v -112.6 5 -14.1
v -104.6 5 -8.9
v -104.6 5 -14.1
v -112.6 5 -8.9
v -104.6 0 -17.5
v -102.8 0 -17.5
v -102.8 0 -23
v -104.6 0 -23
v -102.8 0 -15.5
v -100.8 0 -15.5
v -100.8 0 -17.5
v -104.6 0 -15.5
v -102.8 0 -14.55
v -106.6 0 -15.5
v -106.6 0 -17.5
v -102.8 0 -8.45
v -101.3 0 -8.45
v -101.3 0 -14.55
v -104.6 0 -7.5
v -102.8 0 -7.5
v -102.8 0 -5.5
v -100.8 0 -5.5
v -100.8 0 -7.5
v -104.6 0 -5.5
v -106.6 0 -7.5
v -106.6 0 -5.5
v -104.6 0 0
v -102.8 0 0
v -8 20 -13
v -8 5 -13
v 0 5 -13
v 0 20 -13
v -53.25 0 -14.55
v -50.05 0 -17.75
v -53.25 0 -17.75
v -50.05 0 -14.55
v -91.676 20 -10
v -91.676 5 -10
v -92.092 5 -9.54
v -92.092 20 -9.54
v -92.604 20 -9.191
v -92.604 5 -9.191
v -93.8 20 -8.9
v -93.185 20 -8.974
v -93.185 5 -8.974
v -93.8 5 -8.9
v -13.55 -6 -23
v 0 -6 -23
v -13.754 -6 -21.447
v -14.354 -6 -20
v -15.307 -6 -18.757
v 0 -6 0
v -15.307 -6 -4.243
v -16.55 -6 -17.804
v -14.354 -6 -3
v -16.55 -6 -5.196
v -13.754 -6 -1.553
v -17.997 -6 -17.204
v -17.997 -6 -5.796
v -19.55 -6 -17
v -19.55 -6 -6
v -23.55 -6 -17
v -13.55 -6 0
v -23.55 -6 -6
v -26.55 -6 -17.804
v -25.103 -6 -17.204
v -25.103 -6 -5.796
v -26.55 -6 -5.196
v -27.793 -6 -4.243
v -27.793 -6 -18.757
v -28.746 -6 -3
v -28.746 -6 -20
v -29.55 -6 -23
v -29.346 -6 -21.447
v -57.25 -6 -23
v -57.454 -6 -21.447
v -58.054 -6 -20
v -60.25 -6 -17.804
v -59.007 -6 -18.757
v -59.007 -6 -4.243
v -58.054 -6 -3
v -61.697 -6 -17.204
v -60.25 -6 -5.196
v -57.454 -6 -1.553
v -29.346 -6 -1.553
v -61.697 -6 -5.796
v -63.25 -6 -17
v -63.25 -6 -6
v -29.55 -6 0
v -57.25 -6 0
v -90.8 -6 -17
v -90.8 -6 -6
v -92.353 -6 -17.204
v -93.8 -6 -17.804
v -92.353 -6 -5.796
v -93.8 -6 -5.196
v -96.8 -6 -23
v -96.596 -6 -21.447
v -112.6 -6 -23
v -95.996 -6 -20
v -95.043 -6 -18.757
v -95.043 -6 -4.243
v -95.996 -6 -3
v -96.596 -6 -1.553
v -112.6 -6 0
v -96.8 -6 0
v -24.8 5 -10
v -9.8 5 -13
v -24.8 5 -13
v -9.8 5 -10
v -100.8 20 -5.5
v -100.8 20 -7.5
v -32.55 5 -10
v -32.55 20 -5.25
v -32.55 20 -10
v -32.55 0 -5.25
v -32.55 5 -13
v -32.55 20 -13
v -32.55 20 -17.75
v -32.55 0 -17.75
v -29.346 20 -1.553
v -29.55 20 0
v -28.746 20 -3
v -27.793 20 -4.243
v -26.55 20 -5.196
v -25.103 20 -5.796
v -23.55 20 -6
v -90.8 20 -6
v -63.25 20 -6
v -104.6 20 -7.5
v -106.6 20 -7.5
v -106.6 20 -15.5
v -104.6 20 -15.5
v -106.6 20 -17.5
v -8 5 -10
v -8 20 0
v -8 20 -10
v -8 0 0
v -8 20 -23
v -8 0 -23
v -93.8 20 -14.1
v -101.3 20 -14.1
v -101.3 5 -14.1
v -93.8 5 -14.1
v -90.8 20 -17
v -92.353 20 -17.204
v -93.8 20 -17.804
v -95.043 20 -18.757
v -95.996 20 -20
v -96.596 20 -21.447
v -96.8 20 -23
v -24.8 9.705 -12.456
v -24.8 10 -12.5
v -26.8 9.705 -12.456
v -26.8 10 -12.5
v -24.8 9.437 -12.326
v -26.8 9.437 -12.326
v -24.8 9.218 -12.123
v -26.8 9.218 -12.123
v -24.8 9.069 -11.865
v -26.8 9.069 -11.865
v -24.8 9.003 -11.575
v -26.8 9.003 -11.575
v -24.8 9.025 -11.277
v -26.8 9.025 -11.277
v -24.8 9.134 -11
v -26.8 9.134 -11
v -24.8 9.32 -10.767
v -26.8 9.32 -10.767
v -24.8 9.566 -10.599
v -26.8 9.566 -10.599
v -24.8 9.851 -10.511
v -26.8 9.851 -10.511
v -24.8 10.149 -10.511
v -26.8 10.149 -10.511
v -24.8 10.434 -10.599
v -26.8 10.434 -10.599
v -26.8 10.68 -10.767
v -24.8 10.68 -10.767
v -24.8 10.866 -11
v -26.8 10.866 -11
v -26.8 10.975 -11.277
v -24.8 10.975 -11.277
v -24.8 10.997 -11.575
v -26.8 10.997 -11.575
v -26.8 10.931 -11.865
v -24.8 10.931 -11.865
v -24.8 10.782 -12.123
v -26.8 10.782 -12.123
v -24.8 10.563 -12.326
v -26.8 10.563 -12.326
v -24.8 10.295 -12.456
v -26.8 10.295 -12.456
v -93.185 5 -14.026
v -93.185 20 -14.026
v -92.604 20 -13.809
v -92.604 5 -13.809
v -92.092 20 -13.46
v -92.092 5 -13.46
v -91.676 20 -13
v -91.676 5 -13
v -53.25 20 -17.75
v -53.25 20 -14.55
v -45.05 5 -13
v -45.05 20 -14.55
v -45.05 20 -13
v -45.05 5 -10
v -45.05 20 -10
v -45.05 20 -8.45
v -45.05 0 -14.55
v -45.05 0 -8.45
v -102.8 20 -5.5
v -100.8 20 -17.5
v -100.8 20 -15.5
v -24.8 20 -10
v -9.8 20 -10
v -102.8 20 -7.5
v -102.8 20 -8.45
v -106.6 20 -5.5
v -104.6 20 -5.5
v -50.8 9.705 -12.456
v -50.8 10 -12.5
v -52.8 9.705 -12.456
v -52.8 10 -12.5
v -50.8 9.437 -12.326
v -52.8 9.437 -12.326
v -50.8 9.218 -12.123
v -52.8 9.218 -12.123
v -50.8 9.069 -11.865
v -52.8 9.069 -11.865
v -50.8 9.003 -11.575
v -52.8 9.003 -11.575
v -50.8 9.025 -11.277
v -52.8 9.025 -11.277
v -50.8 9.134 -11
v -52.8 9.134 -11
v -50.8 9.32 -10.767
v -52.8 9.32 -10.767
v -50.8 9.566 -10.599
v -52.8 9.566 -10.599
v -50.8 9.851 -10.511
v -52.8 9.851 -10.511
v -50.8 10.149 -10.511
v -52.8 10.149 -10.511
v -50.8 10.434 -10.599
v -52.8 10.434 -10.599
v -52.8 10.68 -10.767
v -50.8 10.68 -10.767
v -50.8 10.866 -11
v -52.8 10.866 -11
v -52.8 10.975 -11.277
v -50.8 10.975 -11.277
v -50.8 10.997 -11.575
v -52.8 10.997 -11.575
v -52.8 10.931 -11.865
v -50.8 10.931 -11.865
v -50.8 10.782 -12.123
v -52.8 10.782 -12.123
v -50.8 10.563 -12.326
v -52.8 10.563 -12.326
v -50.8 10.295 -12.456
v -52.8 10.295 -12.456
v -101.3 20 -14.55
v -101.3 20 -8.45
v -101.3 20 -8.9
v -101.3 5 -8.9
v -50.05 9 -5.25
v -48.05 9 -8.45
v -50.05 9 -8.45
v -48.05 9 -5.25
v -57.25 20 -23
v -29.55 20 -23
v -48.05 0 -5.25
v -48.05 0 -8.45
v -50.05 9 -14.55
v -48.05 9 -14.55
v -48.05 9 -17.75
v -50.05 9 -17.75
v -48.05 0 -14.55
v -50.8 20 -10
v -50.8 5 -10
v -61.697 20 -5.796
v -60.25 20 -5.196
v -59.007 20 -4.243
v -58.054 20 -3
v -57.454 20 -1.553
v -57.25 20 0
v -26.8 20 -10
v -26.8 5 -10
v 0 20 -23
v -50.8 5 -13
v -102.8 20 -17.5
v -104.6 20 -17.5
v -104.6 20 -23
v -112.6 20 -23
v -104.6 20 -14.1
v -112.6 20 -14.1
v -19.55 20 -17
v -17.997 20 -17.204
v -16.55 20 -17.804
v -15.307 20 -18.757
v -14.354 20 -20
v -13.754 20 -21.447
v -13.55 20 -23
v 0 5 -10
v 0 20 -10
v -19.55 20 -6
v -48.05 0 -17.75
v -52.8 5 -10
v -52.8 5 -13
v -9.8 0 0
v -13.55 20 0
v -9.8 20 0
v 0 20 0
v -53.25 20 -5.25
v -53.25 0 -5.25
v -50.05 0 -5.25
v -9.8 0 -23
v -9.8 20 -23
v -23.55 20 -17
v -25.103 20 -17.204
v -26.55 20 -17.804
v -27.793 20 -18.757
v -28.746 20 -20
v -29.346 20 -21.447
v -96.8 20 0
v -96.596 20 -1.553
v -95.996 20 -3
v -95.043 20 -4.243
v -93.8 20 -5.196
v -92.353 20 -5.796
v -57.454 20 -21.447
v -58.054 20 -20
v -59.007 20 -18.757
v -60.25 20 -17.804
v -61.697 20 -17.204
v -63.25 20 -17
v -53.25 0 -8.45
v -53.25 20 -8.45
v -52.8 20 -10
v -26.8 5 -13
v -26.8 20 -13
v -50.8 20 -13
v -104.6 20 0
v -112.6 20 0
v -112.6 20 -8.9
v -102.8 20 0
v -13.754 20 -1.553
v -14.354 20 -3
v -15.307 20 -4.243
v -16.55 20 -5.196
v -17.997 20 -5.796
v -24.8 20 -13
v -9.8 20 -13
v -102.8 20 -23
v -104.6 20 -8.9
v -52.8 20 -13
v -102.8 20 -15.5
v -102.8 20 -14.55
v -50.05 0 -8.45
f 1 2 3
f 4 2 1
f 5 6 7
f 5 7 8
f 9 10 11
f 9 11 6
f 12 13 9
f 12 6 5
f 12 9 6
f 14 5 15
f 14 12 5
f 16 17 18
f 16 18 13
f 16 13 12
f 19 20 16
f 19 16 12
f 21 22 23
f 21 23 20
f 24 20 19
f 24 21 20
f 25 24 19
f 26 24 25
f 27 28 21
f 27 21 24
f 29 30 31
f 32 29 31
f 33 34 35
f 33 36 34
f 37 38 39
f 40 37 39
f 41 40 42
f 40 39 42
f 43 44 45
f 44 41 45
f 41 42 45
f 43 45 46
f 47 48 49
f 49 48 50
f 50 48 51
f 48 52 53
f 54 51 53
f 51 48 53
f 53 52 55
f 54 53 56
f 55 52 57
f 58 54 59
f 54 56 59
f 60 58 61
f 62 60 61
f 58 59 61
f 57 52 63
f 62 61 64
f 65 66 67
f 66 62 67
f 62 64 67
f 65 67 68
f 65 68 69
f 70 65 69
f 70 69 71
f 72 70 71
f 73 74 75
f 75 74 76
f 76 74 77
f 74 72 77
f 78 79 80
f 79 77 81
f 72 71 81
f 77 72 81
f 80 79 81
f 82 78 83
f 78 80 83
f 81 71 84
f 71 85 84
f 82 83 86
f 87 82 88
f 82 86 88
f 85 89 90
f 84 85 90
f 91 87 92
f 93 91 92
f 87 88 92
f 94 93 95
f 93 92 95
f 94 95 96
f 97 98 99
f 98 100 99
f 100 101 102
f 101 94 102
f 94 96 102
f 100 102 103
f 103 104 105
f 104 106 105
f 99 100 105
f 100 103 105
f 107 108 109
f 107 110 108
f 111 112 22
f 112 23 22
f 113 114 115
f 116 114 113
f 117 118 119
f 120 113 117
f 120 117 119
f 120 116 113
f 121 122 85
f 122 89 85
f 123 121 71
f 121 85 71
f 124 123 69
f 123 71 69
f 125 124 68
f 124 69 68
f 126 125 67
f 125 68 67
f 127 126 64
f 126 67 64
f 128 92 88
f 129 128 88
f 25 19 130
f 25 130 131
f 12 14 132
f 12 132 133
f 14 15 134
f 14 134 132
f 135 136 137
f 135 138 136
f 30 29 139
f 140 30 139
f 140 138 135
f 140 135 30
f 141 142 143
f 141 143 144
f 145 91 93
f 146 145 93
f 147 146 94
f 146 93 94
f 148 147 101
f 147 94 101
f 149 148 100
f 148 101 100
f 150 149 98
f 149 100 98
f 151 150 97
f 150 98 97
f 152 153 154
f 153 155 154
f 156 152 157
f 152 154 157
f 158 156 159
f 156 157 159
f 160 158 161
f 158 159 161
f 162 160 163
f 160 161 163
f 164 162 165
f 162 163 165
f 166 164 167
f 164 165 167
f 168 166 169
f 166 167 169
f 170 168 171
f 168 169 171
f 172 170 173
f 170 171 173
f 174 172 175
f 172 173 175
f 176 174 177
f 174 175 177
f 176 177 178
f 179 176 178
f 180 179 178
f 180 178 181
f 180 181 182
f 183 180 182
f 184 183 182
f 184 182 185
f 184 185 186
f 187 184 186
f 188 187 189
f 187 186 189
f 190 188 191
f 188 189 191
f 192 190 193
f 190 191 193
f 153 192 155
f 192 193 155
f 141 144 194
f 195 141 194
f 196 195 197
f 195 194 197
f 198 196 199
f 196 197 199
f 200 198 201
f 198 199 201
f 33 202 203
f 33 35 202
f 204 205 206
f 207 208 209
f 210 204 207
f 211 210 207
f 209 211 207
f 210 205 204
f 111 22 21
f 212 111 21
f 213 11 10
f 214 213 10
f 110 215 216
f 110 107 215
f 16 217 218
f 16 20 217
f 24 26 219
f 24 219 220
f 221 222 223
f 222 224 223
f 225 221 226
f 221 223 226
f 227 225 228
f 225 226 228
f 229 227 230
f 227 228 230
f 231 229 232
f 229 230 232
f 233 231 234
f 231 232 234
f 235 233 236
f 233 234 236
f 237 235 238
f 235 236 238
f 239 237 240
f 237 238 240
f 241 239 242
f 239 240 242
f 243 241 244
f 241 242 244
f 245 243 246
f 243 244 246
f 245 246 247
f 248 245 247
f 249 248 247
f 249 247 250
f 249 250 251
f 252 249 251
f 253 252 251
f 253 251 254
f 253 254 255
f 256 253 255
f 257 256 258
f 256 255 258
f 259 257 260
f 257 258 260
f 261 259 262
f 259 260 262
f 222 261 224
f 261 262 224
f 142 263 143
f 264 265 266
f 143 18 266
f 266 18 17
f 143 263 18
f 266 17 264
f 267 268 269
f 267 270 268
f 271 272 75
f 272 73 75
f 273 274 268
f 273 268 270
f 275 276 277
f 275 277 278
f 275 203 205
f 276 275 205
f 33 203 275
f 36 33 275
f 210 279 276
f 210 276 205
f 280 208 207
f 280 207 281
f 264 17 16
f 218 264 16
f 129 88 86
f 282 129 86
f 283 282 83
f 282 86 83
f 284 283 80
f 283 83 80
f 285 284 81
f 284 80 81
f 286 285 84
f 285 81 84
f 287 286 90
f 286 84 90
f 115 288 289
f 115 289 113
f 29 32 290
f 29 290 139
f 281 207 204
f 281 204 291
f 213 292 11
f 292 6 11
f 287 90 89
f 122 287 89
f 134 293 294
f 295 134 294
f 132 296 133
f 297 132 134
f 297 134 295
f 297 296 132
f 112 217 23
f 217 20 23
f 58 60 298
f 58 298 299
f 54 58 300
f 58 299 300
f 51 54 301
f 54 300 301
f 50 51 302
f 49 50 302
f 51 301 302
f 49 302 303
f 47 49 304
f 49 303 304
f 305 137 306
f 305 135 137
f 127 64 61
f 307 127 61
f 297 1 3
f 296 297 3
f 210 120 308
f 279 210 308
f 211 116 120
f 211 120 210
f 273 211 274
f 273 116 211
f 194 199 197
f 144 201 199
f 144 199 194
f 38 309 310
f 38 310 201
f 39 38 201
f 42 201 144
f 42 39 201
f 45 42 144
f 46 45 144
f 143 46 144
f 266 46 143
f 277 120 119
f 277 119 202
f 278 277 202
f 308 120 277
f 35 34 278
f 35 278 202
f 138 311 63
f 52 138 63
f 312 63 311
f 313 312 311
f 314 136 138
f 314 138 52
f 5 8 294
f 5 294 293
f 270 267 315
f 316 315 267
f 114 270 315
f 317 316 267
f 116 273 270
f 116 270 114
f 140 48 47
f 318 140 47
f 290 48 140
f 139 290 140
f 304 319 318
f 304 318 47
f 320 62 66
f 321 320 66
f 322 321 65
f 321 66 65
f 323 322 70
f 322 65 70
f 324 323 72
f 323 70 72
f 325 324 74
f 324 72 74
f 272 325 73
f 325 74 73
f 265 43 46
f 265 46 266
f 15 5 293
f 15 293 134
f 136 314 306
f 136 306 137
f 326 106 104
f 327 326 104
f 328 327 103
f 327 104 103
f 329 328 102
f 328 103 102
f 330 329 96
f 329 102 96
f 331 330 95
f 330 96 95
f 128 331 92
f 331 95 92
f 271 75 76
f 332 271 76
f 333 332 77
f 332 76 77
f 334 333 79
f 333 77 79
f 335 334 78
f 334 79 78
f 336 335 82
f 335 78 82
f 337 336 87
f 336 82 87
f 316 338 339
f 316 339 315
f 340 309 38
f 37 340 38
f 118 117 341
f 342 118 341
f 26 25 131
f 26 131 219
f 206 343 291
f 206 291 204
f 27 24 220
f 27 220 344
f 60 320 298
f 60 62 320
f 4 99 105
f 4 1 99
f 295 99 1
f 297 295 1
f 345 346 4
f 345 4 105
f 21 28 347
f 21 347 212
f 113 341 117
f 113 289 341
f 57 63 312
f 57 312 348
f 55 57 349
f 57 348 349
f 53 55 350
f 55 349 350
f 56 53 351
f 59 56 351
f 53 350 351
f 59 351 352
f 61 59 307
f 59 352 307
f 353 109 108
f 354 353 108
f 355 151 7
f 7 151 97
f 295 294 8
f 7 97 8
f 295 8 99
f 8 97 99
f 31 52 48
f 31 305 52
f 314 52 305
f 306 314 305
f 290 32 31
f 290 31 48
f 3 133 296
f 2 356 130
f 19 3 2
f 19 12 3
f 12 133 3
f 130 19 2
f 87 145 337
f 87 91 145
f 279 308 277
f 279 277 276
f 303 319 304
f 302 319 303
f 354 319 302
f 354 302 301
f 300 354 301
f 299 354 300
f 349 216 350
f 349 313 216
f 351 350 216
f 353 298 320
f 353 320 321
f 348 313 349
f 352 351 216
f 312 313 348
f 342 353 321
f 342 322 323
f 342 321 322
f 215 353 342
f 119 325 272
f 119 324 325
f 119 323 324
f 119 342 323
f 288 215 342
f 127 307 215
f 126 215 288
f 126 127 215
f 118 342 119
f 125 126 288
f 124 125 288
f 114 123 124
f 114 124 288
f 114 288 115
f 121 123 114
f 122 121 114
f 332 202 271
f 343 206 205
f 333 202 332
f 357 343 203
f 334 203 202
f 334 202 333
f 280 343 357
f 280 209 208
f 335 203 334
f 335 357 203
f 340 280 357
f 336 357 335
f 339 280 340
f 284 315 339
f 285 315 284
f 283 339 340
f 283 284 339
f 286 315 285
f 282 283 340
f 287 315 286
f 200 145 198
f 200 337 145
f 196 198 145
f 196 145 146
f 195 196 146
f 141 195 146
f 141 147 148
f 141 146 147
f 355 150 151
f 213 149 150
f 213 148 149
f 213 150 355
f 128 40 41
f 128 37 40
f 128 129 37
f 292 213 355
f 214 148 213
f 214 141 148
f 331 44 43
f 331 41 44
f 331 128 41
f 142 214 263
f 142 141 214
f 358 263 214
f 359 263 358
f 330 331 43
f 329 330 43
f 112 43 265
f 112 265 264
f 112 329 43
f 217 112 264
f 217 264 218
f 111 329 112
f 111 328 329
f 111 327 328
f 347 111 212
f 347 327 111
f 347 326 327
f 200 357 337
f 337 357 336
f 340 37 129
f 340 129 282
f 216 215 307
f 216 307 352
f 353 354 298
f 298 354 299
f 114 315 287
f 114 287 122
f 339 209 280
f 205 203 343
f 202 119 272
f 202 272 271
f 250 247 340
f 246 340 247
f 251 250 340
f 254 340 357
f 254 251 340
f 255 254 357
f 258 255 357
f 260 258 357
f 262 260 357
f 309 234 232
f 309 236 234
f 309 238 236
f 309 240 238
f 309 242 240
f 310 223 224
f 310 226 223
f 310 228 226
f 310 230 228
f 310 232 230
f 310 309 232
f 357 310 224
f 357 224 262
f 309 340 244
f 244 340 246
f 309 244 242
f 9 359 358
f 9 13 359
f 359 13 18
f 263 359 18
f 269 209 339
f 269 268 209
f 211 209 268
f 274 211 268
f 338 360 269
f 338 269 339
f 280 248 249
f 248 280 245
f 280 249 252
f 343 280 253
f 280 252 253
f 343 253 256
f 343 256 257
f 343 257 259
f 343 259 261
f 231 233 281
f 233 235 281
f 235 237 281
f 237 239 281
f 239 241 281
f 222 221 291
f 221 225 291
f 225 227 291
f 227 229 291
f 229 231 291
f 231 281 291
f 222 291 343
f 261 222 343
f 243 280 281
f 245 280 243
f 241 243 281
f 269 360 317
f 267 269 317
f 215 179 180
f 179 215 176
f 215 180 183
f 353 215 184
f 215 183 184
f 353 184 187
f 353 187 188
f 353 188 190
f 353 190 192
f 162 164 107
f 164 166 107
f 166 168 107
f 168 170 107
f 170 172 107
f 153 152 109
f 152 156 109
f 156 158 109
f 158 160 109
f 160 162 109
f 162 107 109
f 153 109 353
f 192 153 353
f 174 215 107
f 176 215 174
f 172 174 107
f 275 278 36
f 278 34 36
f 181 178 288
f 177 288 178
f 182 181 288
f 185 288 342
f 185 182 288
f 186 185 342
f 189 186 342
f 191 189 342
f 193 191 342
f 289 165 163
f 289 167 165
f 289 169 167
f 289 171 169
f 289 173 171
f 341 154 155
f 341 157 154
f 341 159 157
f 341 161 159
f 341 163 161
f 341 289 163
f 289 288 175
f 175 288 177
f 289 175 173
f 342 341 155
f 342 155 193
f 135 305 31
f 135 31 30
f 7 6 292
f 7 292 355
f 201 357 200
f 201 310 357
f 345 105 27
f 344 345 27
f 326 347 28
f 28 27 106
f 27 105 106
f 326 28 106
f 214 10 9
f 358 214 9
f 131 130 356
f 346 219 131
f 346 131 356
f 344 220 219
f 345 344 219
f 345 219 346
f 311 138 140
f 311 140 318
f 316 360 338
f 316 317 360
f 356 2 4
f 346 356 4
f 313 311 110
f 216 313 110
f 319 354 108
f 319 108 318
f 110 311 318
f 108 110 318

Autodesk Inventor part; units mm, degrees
ref_plane "YZ Plane" through (0, 0, 0) normal (1, 0, 0) x (0, 1, 0)
ref_plane "XZ Plane" through (0, 0, 0) normal (0, 1, 0) x (-1, 0, 0)
ref_plane "XY Plane" through (0, 0, 0) normal (0, 0, 1) x (1, 0, 0)
sketch "Sketch1" plane through (0, 0, 0) normal (0, 1, 0) x (-1, 0, 0)
  line L0 (45.05, -5.25) -> (32.55, -5.25)
  line L1 (32.55, -5.25) -> (32.55, -17.75)
  line L2 (32.55, -17.75) -> (45.05, -17.75)
  line L3 (45.05, -17.75) -> (45.05, -5.25)
  line L4 (0, 0) -> (0, -23)
  line L5 (112.6, -23) -> (112.6, 0)
  line L6 (77.3838, -11.5) -> (49.3838, -11.5) construction
  line L7 (38.8, -2.0322) -> (38.8, -23.0322) construction
  line L8 (93.8, -8.9) -> (112.6, -8.9)
  line L9 (112.6, -14.1) -> (93.8, -14.1)
  line L10 (9.8, 0) -> (9.8, -23)
  line L11 (8, 0) -> (8, -23)
  line L12 (24.8, -10) -> (0, -10)
  line L13 (24.8, -13) -> (0, -13)
  line L14 (102.8, -14.55) -> (101.3, -14.55)
  line L15 (101.3, -14.55) -> (101.3, -8.45)
  line L16 (101.3, -8.45) -> (102.8, -8.45)
  line L17 (50.8, -10) -> (50.8, -13)
  line L18 (50.8, -13) -> (45.05, -13)
  line L19 (45.05, -10) -> (50.8, -10)
  line L20 (32.55, -13) -> (26.8, -13)
  line L21 (26.8, -10) -> (32.55, -10)
  line L22 (102.8, -17.5) -> (100.8, -17.5)
  line L23 (100.8, -17.5) -> (100.8, -15.5)
  line L24 (100.8, -15.5) -> (102.8, -15.5)
  line L25 (102.8, -7.5) -> (100.8, -7.5)
  line L26 (100.8, -7.5) -> (100.8, -5.5)
  line L27 (100.8, -5.5) -> (102.8, -5.5)
  line L28 (137, -16.5) -> (122.5716, -16.5) construction
  line L29 (137, -6.5) -> (123, -6.5) construction
  line L30 (104.6, -17.5) -> (106.6, -17.5)
  line L31 (106.6, -17.5) -> (106.6, -15.5)
  line L32 (106.6, -15.5) -> (104.6, -15.5)
  line L33 (104.6, -7.5) -> (106.6, -7.5)
  line L34 (106.6, -7.5) -> (106.6, -5.5)
  line L35 (106.6, -5.5) -> (104.6, -5.5)
  line L36 (104.6, -23) -> (104.6, -17.5)
  line L37 (102.8, -17.5) -> (102.8, -23)
  line L38 (104.6, -15.5) -> (104.6, -7.5)
  line L39 (104.6, -5.5) -> (104.6, 0)
  line L40 (102.8, 0) -> (102.8, -5.5)
  line L41 (102.8, -7.5) -> (102.8, -15.5)
  line L42 (45.05, -17.75) -> (53.25, -17.75)
  line L43 (53.25, -17.75) -> (53.25, -14.55)
  line L44 (53.25, -14.55) -> (45.05, -14.55)
  line L45 (45.05, -8.45) -> (53.25, -8.45)
  line L46 (53.25, -8.45) -> (53.25, -5.25)
  line L47 (53.25, -5.25) -> (45.05, -5.25)
  line L48 (48.05, -17.75) -> (48.05, -14.55)
  line L49 (50.05, -17.75) -> (50.05, -14.55)
  line L50 (50.05, -8.45) -> (50.05, -5.25)
  line L51 (48.05, -8.45) -> (48.05, -5.25)
  line L52 (52.8, -10) -> (52.8, -13)
  line L53 (26.8, -10) -> (26.8, -13)
  line L54 (24.8, -10) -> (24.8, -13)
  line L55 (52.8, -13) -> (91.6763, -13)
  line L56 (52.8, -10) -> (91.6763, -10)
  arc A0 (93.8, -8.9) -> (91.6763, -10) centre (93.8, -11.5) ccw
  arc A1 (91.6763, -13) -> (93.8, -14.1) centre (93.8, -11.5) ccw
  arc A2 (96.8, -23) -> (90.8, -17) centre (90.8, -23) ccw
  arc A3 (63.25, -17) -> (57.25, -23) centre (63.25, -23) ccw
  arc A4 (90.8, -6) -> (96.8, 0) centre (90.8, 0) ccw
  arc A5 (57.25, 0) -> (63.25, -6) centre (63.25, 0) ccw
  line L57 (90.8, -17) -> (63.25, -17)
  line L58 (90.8, -6) -> (63.25, -6)
  line L59 (112.6, 0) -> (96.8, 0)
  line L60 (96.8, -23) -> (112.6, -23)
  arc A6 (29.55, -23) -> (23.55, -17) centre (23.55, -23) ccw
  arc A7 (23.55, -6) -> (29.55, 0) centre (23.55, 0) ccw
  arc A8 (19.55, -17) -> (13.55, -23) centre (19.55, -23) ccw
  arc A9 (13.55, 0) -> (19.55, -6) centre (19.55, 0) ccw
  line L61 (23.55, -6) -> (19.55, -6)
  line L62 (23.55, -17) -> (19.55, -17)
  line L63 (0, -23) -> (13.55, -23)
  line L64 (29.55, -23) -> (57.25, -23)
  line L65 (57.25, 0) -> (29.55, 0)
  line L66 (13.55, 0) -> (0, 0)
  line L67 (115.3, -25) -> (115.3, 2)
  line L68 (-2.7, 2) -> (-2.7, -25)
  arc A10 (65.25, -19) -> (59.25, -25) centre (65.25, -25) ccw
  arc A11 (94.8, -25) -> (88.8, -19) centre (88.8, -25) ccw
  line L69 (56.3, -20.25) -> (56.3, -1) construction
  arc A12 (59.25, 2) -> (65.25, -4) centre (65.25, 2) ccw
  arc A13 (88.8, -4) -> (94.8, 2) centre (88.8, 2) ccw
  arc A14 (15.55, 2) -> (27.55, 2) centre (21.55, 2) ccw
  arc A15 (27.55, -25) -> (15.55, -25) centre (21.55, -25) ccw
  line L70 (88.8, -19) -> (65.25, -19)
  line L71 (88.8, -4) -> (65.25, -4)
  line L72 (115.3, 2) -> (94.8, 2)
  line L73 (94.8, -25) -> (115.3, -25)
  line L74 (-2.7, -25) -> (15.55, -25)
  line L75 (27.55, -25) -> (59.25, -25)
  line L76 (59.25, 2) -> (27.55, 2)
  line L77 (15.55, 2) -> (-2.7, 2)
  line L78 (125.6323, 7.0516) -> (125.6323, -28.0034) construction
  line L79 (125.6323, -28.0034) -> (118.769, -28.0034) construction
  line L80 (118.769, -28.0034) -> (118.769, 7.0516) construction
  line L81 (118.769, 7.0516) -> (125.6323, 7.0516) construction
  point P0 (104.6, -8.9)
  point P1 (104.6, -14.1)
  point P2 (102.8, -8.9)
  point P3 (102.8, -14.1)
  point P4 (9.8, -13)
  point P5 (8, -13)
  point P6 (8, -10)
  point P7 (9.8, -10)
  point P8 (38.8, -11.5)
  point P9 (101.3, -14.1)
  point P10 (101.3, -8.9)
  dimension "d0" = 12.5
  dimension "d1" = 12.5
  dimension "d3" = 23
  dimension "d12" = 5.2
  dimension "d20" = 1.8
  dimension "d25" = 3
  dimension "d36" = 6.1
  dimension "d37" = 1.5
  dimension "d62" = 3
  dimension "d63" = 3
  dimension "d94" = 2
  dimension "d95" = 2
  dimension "d96" = 10
  dimension "d97" = 1.8
  dimension "d106" = 8.2
  dimension "d107" = 3
  dimension "d108" = 2
  dimension "d109" = 3.2
  dimension "d113" = 1.5
  dimension "d114" = 2
  dimension "d115" = 64
  dimension "d116" = 29
  dimension "d117" = 8
  dimension "d118" = 8
  dimension "d119" = 2
  dimension "d120" = 12
  dimension "d121" = 12
  dimension "d122" = 9
  dimension "d129" = 12
  dimension "d130" = 12
  dimension "d131" = 10
  dimension "d134" = 9
  dimension "d135" = 4
  dimension "d149" = 118
  dimension "d150" = 27
  dimension "d152" = 11
  dimension "d153" = 12
  dimension "d154" = 14
extrude "Extrusion16" add sketch "Sketch1" against normal blind 6 contours L3 L2 L1 L0 | L47 L51 L45 L3 | L47 L50 L45 L51 | L1 L20 L53 L21 | L19 L17 L18 L3 | L47 L46 L45 L50 | L44 L48 L42 L3 | L44 L49 L42 L48 | L44 L43 L42 L49 | L66 L11 L12 L4 | L12 L11 L13 L4 | L66 L10 L12 L11 | L13 L11 L63 L4 | L12 L10 L13 L11 | L66 A9 L61 A7 L65 A5 L58 A4 L59 L40 L27 L26 L25 L41 L16 L15 L8 A0 L56 L52 L55 A1 L9 L14 L24 L23 L22 L37 L60 A2 L57 A3 L64 A6 L62 A8 L63 L10 L13 L54 L12 | L13 L10 L63 L11 | L12 L54 L13 L10 | L59 L39 L35 L34 L33 L38 L8 L41 L25 L26 L27 L40 | L59 L5 L8 L38 L33 L34 L35 L39 | L37 L22 L23 L24 L41 L9 L38 L32 L31 L30 L36 L60 | L5 L9 L38 L8 | L36 L30 L31 L32 L38 L9 L5 L60 | L38 L9 L41 L8 | L41 L8 L15 L16 | L41 L9 L15 L8 | L41 L14 L15 L9 | L15 L9 A1 L55 L52 L56 A0 L8
extrude "Extrusion17" add sketch "Sketch1" along normal blind 20 contours L66 L11 L12 L4 | L13 L11 L63 L4 | L66 A9 L61 A7 L65 A5 L58 A4 L59 L40 L27 L26 L25 L41 L16 L15 L8 A0 L56 L52 L55 A1 L9 L14 L24 L23 L22 L37 L60 A2 L57 A3 L64 A6 L62 A8 L63 L10 L13 L54 L12 | L59 L5 L8 L38 L33 L34 L35 L39 | L36 L30 L31 L32 L38 L9 L5 L60
extrude "Extrusion18" add sketch "Sketch1" along normal blind 5 contours L1 L20 L53 L21 | L19 L17 L18 L3 | L12 L11 L13 L4 | L12 L54 L13 L10 | L5 L9 L38 L8 | L15 L9 A1 L55 L52 L56 A0 L8
extrude "Extrusion19" add sketch "Sketch1" along normal blind 9 contours L47 L50 L45 L51 | L44 L49 L42 L48
sketch "Sketch2" plane through (0, -6, 0) normal (1, 0, 0) x (0, 0, -1)
  line L0 (11.5, 16) -> (11.5, 6.397) construction
  line L1 (0, 6) -> (23, 6) construction
  line L2 (0, 1.5617) -> (0, -5) construction
  line L3 (23, -1.6862) -> (23, -8) construction
  point P0 (11.5, 16)
  dimension "d139" = 10
hole "Hole1" at (0, 10, -11.5) direction (-1, 0, 0) diameter 2 end through all
properties part number "Spirulina_prototype2"
